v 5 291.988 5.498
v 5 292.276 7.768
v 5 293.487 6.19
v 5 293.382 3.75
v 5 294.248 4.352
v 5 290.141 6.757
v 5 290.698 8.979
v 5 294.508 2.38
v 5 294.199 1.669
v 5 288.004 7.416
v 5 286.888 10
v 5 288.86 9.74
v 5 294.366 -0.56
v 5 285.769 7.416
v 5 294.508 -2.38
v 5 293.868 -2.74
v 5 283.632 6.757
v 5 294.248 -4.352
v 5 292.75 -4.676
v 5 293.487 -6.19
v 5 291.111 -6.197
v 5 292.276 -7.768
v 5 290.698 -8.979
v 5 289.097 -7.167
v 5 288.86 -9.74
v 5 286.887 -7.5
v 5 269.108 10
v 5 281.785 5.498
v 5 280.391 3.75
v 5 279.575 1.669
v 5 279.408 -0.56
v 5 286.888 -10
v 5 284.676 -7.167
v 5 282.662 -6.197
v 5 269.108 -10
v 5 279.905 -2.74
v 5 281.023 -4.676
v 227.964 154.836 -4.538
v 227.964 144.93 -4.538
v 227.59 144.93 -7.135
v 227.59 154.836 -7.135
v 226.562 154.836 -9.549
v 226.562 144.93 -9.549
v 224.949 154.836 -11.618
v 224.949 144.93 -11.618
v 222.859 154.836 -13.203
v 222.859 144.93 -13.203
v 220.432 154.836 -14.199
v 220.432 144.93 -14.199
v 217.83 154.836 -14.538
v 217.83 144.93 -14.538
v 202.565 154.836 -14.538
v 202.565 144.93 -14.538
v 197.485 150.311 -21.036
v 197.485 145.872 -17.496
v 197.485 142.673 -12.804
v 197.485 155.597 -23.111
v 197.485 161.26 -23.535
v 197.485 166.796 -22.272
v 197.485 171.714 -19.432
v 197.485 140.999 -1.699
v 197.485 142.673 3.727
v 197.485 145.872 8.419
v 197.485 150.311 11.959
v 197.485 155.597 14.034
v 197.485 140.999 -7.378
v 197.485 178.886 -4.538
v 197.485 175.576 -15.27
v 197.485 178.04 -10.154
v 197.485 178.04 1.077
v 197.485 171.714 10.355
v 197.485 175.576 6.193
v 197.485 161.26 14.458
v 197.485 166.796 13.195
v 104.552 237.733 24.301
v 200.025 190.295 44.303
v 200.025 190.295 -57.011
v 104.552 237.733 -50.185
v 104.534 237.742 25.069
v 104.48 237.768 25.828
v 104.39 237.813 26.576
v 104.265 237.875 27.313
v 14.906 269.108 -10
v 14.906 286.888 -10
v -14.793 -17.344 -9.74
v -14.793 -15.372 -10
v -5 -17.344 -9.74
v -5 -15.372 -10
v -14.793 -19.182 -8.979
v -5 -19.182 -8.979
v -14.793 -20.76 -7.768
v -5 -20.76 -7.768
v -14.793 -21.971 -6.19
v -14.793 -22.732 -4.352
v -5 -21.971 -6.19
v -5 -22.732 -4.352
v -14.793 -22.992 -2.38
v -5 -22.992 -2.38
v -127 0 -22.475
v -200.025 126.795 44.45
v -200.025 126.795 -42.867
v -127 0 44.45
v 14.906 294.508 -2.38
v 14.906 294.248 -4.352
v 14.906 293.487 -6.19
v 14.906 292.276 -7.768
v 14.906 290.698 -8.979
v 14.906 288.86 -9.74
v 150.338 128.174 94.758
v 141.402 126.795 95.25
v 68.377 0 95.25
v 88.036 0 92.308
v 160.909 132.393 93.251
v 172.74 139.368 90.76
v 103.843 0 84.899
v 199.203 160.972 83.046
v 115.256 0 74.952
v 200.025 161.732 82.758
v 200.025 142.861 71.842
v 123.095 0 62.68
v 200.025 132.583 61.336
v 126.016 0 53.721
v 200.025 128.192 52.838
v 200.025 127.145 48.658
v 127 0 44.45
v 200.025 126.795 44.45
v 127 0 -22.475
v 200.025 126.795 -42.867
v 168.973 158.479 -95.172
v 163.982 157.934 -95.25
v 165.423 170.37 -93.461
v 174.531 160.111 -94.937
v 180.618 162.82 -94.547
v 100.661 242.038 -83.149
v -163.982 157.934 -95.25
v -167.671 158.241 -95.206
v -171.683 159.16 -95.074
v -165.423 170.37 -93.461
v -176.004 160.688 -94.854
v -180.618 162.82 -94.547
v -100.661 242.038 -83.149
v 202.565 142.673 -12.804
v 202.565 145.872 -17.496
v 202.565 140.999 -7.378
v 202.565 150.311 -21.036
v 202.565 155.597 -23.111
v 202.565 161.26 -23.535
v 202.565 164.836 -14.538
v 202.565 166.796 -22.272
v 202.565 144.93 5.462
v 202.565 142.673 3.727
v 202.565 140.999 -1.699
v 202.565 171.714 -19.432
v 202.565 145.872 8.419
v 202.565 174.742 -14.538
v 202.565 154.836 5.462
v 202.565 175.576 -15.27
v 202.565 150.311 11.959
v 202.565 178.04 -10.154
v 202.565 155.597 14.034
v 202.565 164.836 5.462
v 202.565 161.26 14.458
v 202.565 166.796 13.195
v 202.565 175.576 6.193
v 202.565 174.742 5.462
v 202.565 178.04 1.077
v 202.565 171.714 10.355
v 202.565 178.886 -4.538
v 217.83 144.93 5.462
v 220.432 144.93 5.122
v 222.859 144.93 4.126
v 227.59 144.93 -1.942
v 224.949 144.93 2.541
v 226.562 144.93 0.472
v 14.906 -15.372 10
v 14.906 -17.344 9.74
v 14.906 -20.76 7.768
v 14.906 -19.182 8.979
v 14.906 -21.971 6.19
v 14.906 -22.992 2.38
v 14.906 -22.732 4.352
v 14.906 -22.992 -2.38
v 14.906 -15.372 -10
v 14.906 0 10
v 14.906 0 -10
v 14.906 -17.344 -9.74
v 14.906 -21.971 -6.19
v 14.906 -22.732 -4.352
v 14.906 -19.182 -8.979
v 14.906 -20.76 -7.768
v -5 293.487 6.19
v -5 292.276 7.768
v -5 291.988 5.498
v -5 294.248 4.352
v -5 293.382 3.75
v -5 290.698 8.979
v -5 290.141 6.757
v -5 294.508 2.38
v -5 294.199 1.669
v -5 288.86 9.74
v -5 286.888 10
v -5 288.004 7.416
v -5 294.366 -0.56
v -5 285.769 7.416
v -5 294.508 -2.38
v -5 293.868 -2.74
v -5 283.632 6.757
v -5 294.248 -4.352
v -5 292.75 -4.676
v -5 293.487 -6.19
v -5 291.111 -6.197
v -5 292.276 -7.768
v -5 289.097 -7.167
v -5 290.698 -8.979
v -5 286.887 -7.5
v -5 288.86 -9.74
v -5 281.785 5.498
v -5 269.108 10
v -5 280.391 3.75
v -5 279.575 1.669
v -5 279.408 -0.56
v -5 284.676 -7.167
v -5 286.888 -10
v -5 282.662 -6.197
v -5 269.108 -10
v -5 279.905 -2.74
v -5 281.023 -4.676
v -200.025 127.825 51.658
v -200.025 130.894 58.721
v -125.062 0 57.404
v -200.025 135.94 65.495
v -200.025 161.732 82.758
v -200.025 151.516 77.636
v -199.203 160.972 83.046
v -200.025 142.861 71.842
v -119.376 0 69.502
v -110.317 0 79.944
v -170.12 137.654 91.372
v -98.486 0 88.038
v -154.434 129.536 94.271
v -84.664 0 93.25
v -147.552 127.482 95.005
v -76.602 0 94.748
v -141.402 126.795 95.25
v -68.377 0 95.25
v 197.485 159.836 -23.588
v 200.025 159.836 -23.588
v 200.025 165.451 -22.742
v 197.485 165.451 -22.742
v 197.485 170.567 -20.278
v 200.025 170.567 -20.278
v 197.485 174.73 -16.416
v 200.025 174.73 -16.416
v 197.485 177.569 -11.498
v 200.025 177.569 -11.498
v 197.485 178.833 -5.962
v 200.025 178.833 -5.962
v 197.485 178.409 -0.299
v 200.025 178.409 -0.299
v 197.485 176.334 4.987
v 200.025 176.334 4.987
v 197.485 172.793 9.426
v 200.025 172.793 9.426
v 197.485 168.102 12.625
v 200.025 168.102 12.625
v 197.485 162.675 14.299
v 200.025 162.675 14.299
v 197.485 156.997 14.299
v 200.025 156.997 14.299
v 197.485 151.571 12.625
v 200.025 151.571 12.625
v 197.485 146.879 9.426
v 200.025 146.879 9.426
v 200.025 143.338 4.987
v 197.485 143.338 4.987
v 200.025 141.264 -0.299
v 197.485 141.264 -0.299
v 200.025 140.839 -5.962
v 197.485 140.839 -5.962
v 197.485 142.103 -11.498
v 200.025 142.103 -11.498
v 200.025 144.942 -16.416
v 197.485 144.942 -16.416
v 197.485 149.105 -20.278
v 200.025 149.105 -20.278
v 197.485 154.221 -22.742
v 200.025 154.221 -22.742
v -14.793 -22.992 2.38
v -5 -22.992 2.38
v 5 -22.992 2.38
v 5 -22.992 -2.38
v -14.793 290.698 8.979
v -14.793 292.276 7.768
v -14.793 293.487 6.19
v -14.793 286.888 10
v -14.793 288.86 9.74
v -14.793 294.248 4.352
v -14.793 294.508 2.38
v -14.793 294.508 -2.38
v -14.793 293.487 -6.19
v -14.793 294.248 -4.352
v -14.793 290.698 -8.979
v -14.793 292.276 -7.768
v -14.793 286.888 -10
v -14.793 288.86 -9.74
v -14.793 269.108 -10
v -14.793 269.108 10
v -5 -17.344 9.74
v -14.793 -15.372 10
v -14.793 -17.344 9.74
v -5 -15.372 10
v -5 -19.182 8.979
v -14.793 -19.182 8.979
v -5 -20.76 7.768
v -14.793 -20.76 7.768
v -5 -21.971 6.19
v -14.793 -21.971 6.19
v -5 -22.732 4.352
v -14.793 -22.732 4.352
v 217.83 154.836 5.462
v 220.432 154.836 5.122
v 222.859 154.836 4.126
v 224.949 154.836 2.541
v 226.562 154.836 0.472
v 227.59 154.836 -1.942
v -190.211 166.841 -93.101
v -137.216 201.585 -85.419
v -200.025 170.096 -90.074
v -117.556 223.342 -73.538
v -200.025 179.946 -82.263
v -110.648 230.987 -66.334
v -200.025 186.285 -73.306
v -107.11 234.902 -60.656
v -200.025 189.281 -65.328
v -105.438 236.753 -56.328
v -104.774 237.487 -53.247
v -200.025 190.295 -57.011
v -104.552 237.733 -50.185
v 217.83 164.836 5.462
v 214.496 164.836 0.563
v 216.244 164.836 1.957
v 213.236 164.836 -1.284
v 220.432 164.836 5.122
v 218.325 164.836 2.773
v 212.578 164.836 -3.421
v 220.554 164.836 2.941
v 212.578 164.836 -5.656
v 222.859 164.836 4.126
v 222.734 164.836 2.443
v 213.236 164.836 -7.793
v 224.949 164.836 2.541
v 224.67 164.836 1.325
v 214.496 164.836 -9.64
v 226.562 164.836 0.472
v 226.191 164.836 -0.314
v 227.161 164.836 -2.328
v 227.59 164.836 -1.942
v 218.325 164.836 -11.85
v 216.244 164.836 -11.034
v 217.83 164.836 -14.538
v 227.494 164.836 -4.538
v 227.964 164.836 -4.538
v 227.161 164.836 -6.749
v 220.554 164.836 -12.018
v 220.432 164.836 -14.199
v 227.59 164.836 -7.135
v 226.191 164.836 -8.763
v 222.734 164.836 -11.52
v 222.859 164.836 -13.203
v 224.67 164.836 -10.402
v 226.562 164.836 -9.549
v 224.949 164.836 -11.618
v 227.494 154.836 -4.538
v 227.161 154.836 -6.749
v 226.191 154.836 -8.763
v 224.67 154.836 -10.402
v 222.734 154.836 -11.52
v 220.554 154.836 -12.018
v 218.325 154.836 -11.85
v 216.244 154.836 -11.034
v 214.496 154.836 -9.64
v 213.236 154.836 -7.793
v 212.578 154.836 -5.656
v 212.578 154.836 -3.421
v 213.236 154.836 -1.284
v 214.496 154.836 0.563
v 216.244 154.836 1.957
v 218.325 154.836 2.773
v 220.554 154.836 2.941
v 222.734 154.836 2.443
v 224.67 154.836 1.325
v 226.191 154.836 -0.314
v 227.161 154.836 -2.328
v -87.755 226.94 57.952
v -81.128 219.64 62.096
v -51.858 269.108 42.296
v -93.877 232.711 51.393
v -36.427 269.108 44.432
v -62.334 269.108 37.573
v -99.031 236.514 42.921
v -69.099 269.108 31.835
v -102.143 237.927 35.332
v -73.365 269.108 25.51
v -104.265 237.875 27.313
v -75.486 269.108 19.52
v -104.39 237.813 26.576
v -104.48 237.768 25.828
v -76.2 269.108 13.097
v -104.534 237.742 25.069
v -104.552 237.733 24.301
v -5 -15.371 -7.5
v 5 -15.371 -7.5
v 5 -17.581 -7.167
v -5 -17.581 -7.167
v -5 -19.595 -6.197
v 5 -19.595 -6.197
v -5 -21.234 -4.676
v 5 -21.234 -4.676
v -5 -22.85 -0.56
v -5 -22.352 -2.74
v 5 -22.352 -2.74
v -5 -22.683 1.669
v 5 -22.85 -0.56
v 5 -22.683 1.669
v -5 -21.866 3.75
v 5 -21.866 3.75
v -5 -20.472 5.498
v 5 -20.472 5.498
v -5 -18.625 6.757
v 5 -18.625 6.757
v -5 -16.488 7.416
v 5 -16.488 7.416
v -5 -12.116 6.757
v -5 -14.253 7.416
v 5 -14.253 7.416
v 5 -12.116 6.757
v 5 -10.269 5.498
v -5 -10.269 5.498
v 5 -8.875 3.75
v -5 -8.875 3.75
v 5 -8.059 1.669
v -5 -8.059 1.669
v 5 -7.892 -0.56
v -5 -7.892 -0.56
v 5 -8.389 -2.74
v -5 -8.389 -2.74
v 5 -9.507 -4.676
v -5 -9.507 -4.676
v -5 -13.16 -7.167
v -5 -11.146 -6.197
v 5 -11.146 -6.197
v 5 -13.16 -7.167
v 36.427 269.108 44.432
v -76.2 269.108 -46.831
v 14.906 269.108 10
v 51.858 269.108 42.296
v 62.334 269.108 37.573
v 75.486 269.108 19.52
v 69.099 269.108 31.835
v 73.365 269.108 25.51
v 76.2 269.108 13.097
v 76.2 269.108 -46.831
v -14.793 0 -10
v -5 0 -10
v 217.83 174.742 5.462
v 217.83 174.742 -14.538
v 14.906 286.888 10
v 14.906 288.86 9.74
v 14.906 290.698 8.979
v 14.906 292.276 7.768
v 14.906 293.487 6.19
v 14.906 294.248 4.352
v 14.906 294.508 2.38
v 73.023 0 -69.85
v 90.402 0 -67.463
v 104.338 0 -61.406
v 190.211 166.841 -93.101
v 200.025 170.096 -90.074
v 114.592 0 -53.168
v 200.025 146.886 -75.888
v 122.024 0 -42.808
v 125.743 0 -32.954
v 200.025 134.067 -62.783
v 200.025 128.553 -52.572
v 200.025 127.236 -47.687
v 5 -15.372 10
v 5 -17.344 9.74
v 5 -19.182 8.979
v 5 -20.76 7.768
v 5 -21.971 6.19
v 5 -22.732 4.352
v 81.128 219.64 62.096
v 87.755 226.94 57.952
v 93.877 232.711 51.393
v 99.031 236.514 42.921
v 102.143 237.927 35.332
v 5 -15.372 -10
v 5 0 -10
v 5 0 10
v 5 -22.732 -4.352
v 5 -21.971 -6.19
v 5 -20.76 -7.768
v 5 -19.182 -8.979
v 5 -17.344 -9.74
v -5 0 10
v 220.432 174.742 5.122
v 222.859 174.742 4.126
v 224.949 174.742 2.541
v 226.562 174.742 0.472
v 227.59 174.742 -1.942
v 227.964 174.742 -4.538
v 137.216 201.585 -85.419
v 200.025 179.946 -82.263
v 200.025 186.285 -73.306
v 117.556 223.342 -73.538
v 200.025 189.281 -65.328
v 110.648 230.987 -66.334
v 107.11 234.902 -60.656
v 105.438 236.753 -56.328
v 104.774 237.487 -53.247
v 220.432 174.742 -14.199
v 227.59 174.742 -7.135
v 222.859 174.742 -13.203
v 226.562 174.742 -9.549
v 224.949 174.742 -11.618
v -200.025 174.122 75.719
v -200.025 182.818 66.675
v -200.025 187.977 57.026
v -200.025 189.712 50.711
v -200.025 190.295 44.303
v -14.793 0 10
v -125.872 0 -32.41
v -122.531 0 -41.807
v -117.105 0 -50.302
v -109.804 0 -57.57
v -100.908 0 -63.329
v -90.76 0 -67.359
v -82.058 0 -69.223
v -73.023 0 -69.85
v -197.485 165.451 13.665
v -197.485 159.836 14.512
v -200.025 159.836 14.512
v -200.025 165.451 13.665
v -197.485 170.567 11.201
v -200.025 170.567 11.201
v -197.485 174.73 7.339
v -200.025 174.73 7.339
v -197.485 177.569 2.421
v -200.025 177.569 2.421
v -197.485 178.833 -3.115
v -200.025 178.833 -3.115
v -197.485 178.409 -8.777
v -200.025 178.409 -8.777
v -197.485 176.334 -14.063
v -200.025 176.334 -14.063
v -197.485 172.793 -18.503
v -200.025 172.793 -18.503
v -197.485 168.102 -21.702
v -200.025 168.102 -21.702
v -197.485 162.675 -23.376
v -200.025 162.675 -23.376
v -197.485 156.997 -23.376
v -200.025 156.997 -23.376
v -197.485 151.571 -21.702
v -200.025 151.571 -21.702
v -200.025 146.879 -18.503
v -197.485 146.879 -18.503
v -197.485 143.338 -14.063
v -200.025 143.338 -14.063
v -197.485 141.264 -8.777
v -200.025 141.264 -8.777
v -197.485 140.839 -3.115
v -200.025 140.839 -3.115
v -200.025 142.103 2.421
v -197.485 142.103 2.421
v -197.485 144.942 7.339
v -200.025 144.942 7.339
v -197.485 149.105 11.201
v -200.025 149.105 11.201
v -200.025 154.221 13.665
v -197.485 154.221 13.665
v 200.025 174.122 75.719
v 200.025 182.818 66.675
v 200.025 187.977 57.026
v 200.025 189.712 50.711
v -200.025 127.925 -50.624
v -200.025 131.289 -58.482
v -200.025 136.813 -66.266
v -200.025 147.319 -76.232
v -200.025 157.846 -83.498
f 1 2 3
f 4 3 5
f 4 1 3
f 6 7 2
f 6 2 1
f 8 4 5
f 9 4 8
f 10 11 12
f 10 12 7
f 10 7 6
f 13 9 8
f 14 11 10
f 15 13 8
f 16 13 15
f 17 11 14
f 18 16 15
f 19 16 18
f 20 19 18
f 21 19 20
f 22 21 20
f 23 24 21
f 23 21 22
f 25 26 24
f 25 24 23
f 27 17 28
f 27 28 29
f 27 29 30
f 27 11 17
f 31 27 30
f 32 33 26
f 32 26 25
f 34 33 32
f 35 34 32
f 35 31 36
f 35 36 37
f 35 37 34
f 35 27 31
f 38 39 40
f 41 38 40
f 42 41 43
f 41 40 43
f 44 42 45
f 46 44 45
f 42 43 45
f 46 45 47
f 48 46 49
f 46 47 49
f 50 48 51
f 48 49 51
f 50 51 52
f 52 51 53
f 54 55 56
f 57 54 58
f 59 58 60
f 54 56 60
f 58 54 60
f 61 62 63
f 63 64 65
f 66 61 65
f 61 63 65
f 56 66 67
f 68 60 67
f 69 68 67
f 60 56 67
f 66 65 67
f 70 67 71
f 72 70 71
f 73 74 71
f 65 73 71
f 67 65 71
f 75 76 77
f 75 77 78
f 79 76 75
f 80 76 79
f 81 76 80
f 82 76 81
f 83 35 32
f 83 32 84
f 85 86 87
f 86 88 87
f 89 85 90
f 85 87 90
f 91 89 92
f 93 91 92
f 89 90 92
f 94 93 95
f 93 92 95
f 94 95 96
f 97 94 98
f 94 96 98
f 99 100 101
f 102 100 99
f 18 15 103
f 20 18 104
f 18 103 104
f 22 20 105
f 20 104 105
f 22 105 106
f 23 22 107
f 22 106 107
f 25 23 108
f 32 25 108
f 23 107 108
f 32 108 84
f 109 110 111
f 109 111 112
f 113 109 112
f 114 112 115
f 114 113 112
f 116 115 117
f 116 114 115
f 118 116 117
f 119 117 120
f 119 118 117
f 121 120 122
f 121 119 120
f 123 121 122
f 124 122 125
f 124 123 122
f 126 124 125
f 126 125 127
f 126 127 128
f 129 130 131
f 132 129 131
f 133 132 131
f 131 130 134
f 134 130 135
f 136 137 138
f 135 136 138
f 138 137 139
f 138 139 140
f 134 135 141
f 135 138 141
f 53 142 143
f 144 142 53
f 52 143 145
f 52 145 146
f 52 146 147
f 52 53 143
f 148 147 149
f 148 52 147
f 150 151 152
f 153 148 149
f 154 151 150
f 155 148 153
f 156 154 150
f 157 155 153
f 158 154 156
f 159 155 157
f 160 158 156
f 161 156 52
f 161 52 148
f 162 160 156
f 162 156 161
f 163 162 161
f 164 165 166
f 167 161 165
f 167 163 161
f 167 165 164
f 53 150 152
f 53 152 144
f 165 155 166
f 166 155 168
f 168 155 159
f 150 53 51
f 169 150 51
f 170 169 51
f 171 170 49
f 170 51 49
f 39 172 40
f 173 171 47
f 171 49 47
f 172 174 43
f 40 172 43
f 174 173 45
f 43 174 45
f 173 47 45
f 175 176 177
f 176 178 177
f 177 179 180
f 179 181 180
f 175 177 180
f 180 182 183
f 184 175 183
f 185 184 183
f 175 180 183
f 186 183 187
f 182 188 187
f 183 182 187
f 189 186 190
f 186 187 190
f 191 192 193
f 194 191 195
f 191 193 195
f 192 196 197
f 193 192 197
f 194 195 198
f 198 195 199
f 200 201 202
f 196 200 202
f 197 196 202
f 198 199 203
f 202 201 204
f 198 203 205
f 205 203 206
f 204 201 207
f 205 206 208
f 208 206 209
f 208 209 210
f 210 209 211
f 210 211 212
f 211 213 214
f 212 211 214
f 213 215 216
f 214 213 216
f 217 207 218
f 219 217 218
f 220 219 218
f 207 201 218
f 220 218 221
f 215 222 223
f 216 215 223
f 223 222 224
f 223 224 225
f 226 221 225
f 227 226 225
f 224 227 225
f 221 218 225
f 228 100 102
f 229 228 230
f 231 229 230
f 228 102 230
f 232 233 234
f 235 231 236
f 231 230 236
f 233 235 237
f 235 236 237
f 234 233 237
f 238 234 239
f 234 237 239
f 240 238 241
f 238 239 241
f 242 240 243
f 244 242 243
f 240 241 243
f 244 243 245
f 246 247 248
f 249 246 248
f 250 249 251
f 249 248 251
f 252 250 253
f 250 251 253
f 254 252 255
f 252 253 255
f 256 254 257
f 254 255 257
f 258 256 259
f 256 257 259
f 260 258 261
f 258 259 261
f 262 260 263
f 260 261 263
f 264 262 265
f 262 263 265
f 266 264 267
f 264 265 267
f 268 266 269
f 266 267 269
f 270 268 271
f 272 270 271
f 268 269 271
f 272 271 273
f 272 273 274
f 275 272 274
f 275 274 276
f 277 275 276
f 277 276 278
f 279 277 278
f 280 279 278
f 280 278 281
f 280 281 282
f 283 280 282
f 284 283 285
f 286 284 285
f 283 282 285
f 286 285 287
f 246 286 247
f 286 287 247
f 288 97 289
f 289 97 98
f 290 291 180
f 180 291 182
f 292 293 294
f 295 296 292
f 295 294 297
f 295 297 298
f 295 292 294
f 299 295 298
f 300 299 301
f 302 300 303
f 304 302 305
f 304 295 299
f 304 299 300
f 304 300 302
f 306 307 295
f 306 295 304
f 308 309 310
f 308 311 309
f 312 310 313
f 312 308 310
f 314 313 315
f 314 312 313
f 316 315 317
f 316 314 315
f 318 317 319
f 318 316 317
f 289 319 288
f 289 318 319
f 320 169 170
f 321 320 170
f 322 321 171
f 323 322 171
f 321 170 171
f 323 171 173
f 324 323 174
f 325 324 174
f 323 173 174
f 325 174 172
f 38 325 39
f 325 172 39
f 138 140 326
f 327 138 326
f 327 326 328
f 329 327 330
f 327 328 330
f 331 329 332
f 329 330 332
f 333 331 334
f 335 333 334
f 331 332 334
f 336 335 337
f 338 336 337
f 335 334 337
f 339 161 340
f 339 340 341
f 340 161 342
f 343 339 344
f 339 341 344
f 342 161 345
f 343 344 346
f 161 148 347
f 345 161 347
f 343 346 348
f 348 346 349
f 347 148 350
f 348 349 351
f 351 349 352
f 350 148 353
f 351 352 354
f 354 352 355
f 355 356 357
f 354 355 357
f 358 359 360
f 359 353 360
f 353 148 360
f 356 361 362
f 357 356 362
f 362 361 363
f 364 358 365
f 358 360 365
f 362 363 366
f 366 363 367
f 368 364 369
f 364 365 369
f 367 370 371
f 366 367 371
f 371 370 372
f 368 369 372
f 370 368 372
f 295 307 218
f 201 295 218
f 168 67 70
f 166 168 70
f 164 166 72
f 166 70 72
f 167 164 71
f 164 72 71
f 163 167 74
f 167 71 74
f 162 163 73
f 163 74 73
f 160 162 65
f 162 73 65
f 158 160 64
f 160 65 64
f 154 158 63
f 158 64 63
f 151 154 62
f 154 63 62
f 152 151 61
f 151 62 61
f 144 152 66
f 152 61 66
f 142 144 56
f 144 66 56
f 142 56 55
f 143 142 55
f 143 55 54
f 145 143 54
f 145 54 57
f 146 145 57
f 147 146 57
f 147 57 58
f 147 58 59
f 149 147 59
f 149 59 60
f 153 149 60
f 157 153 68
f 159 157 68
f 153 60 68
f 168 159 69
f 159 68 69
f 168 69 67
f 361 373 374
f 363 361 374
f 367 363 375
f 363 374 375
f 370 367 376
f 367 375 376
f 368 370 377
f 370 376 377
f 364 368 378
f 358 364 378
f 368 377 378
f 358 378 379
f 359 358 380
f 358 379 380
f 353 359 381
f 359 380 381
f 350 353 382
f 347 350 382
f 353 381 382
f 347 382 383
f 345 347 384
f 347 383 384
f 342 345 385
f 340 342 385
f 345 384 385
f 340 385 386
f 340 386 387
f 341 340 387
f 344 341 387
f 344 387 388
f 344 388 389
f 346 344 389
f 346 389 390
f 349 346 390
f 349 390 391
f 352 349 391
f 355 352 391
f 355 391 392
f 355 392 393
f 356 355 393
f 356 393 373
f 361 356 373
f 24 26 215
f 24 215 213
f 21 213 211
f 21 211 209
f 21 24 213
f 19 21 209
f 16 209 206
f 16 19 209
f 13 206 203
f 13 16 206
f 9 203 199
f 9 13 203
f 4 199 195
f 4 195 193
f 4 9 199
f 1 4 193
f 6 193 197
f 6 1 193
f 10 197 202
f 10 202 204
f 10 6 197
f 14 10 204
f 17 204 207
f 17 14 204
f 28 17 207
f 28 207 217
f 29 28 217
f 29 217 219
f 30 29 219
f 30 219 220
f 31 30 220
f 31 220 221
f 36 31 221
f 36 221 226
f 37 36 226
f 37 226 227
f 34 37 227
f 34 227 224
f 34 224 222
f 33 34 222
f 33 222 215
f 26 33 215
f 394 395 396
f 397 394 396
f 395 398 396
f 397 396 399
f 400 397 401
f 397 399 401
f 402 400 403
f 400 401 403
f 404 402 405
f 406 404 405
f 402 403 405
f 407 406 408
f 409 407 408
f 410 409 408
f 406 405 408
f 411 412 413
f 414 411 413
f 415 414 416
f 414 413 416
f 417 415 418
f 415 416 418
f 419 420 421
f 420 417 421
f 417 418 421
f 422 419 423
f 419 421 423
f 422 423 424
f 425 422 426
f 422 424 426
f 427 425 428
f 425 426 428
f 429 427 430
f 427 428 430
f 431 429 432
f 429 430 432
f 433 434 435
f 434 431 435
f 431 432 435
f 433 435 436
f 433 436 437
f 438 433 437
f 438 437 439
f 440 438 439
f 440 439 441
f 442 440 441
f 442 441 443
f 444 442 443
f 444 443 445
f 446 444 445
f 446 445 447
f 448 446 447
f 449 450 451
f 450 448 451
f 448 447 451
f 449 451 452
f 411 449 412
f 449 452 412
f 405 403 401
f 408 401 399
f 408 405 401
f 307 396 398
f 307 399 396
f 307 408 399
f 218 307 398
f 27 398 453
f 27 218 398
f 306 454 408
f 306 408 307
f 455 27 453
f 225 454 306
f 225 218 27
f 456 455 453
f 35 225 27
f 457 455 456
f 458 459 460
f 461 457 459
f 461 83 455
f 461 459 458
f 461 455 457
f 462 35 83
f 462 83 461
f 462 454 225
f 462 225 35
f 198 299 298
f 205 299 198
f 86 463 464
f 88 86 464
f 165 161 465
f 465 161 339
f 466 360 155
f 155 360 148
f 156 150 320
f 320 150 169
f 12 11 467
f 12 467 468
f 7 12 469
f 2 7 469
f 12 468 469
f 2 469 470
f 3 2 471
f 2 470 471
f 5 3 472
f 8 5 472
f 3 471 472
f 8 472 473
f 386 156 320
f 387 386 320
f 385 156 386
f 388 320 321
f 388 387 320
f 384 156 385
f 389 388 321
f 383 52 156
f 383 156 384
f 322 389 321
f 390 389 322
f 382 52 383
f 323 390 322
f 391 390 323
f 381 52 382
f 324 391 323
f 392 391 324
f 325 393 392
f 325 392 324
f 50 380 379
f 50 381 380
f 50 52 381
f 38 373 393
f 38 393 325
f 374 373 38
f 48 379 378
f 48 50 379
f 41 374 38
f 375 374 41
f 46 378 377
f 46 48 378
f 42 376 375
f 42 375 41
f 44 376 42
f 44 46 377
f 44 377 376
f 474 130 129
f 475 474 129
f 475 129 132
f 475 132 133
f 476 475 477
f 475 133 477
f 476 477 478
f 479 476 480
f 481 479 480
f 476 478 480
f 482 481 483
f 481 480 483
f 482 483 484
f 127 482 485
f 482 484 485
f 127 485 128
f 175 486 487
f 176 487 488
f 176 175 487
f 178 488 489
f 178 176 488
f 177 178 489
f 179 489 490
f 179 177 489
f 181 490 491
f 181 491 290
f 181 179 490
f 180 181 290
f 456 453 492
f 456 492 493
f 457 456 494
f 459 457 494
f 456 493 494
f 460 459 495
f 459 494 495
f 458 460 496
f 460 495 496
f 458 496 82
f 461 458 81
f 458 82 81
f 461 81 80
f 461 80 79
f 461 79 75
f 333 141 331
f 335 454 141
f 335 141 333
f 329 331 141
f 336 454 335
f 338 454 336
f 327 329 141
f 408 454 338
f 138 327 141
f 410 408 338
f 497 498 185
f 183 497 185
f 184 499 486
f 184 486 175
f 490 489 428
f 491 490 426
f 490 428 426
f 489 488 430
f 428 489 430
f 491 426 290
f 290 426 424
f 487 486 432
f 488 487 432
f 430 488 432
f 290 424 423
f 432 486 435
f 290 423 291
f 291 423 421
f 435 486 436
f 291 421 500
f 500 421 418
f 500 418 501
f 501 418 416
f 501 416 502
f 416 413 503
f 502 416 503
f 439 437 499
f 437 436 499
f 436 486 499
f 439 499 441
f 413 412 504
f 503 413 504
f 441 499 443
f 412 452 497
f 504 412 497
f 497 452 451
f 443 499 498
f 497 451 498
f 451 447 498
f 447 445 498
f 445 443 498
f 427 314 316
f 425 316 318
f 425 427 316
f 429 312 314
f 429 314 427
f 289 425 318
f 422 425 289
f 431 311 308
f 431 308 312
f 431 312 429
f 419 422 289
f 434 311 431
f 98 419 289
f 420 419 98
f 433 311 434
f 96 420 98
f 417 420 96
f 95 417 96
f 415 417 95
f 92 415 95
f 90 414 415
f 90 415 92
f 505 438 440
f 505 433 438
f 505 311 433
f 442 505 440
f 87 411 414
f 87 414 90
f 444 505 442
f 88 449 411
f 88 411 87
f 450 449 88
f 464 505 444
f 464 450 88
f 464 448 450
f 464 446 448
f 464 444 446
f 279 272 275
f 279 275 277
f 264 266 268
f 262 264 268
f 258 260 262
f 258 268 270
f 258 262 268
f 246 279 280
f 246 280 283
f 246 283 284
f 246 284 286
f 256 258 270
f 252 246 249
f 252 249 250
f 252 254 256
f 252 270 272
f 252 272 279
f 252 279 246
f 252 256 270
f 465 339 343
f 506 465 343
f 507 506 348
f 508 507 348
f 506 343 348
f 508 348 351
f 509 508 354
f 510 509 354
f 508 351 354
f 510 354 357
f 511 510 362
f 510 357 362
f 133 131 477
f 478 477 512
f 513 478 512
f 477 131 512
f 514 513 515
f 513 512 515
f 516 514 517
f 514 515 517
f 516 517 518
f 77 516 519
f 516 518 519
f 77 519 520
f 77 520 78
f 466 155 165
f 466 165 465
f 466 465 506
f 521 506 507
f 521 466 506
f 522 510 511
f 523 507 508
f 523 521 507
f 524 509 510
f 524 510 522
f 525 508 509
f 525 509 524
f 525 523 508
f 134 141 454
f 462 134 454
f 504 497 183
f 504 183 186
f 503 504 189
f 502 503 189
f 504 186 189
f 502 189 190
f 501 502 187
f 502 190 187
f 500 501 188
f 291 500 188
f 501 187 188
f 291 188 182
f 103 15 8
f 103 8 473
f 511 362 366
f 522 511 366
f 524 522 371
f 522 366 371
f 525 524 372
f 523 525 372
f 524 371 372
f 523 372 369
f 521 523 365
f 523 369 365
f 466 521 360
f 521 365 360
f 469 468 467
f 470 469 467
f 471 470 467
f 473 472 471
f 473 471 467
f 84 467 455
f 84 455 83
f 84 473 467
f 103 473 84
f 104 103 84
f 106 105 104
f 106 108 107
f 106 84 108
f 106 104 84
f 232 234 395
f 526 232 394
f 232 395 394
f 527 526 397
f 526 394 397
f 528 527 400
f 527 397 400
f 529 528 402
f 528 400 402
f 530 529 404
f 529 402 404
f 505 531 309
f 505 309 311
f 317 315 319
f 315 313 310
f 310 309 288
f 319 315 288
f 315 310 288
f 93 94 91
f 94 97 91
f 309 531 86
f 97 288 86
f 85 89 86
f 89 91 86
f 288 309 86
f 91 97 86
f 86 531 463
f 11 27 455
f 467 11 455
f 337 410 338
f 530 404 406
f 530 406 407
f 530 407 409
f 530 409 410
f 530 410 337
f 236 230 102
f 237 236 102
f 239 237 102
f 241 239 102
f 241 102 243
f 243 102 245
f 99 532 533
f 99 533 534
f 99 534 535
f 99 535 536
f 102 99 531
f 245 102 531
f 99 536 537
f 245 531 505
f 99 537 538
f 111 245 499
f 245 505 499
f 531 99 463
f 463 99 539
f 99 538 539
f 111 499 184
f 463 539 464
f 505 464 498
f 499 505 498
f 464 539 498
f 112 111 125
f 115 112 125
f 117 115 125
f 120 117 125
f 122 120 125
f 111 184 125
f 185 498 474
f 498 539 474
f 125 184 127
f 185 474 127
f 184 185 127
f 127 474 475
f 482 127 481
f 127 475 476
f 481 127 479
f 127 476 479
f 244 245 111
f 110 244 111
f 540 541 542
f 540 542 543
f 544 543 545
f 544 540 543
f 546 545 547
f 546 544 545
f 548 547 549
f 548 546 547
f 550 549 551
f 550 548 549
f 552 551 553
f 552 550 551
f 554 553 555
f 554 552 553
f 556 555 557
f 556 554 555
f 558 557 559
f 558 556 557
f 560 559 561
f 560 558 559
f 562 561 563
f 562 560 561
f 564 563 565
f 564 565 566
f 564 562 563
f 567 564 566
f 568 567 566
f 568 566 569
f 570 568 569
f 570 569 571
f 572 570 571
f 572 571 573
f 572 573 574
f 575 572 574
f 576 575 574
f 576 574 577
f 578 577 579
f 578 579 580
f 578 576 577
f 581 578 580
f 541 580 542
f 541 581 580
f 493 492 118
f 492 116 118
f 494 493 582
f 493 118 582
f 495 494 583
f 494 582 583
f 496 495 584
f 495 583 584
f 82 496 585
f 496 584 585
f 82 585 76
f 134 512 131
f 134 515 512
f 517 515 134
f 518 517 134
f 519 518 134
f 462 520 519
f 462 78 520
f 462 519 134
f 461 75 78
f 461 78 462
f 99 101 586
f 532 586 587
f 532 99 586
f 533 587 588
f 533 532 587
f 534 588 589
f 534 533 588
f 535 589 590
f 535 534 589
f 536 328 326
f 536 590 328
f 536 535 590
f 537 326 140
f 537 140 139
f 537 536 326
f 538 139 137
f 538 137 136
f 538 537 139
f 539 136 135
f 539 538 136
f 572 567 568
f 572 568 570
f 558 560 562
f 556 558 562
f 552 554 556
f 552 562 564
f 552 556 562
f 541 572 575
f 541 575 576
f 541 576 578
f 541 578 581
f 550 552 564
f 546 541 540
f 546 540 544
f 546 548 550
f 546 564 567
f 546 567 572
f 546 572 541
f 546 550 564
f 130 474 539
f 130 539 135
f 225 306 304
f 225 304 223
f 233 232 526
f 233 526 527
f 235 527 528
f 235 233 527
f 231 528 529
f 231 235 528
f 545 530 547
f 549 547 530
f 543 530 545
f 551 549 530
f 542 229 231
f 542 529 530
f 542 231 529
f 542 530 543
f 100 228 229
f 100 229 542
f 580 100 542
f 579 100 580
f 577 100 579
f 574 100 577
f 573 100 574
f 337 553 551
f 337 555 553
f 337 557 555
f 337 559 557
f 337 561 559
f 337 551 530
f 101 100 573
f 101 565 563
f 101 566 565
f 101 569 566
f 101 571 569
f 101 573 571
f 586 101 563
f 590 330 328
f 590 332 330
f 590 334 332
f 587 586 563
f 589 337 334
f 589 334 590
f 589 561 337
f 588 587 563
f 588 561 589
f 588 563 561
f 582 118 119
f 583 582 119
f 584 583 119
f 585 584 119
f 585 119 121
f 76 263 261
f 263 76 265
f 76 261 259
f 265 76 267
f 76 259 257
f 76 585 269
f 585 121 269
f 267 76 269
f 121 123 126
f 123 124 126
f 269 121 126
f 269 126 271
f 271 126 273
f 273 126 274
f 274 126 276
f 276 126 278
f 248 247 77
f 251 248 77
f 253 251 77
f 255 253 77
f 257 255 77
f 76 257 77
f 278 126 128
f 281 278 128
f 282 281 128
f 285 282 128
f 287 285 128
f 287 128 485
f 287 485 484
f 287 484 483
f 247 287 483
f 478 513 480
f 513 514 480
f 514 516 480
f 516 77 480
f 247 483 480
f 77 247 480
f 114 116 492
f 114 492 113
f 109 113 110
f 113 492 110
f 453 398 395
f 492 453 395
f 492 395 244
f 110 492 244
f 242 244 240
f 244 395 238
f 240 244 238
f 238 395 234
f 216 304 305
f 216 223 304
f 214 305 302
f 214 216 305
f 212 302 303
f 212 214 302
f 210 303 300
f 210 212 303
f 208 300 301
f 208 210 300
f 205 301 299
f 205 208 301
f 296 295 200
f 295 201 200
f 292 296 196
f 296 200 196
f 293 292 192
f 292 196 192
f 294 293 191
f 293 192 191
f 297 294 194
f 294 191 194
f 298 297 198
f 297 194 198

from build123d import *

# Parameters (mm, degrees)
SKETCH1_W                   = 400.05
SKETCH1_H                   = 190.5
EXTRUDE1_DEPTH              = 269.108
SKETCH7_OUTSIDE_W           = 296.182
SKETCH7_OUTSIDE_H           = 374.79
CUT_EXTRUDE1_DEPTH          = 431.8
SKETCH8_OUTSIDE_W           = 505.732
SKETCH8_OUTSIDE_H           = 374.79
CUT_EXTRUDE2_DEPTH          = 431.8
FILLET1_R                   = 50.8
FILLET10_R                  = 38.1
SKETCH9_W                   = 9.7930423
SKETCH9_H                   = 20
SKETCH9_W_2                 = 9.906
BOSS_EXTRUDE1_DEPTH         = 25.4
SKETCH11_R                  = 7.5
BOSS_EXTRUDE3_DEPTH         = 29.6990423
FILLET11_R                  = 7.62
FILLET11_OF_MIRROR1_R       = 7.62
SKETCH12_R                  = 19.05
BOSS_EXTRUDE6_DEPTH         = 2.54
SKETCH14_W                  = 20
SKETCH14_H                  = 9.906
BOSS_EXTRUDE7_DEPTH         = 25.4
BOSS_EXTRUDE8_DEPTH         = 29.812
FILLET15_R                  = 10.1346
BODY_MOVE_COPY1_START       = 144.930148569
BODY_MOVE_COPY1_OUTLINE_R   = 7.5
BODY_MOVE_COPY1_DEPTH       = 29.812
BODY_MOVE_COPY1_2_OUTLINE_R = 7.5
BODY_MOVE_COPY1_2_DEPTH     = 9.906
BODY_MOVE_COPY1_START_2     = 164.836148569
BODY_MOVE_COPY1_3_OUTLINE_R = 7.5
BODY_MOVE_COPY1_3_DEPTH     = 9.906
BODY_MOVE_COPY1_START_3     = 197.485
BODY_MOVE_COPY1_4_OUTLINE_R = 19.05
BODY_MOVE_COPY1_4_DEPTH     = 5.08
CUT_EXTRUDE3_START          = -2.54
SKETCH16_R                  = 19.05
CUT_EXTRUDE3_DEPTH          = 2.54


with BuildPart() as part:
    # Sketch1 → Extrude1 (new body)
    with BuildSketch(Plane(origin=(0, 0, 0), x_dir=(1, 0, 0), z_dir=(0, 1, 0))):
        Rectangle(SKETCH1_W, SKETCH1_H)
    extrude(amount=EXTRUDE1_DEPTH)

    # Sketch7 outside → Cut-Extrude1 (cut)
    with BuildSketch(Plane.ZY.offset(200.025)):
        with Locations((0, 134.554)):
            Rectangle(SKETCH7_OUTSIDE_W, SKETCH7_OUTSIDE_H)
        Polygon((44.432087016, 269.108), (95.25, 126.795116664), (95.25, 0), (-69.85, 0), (-95.25, 157.93380788), (-83.14873838, 242.038278884), (-46.830898628, 269.108), align=None, mode=Mode.SUBTRACT)
    extrude(amount=-CUT_EXTRUDE1_DEPTH, mode=Mode.SUBTRACT)

    # Sketch8 outside → Cut-Extrude2 (cut)
    with BuildSketch(Plane.XY.offset(95.25)):
        with Locations((0, 134.554)):
            Rectangle(SKETCH8_OUTSIDE_W, SKETCH8_OUTSIDE_H)
        Polygon((127, 0), (200.025, 126.795116664), (200.025, 190.295116664), (104.551859803, 237.732642625), (76.2, 269.108), (-76.2, 269.108), (-104.551859803, 237.732642625), (-200.025, 190.295116664), (-200.025, 126.795116664), (-127, 0), align=None, mode=Mode.SUBTRACT)
    extrude(amount=-CUT_EXTRUDE2_DEPTH, mode=Mode.SUBTRACT)

    # Fillet1
    fillet1_edges = [part.edges().sort_by_distance(p)[0] for p in [
        (-163.5125, 63.397558332, 95.25),
        (-163.5125, 63.397558332, -80.046030877),
        (163.5125, 63.397558332, -80.046030877),
        (163.5125, 63.397558332, 95.25),
    ]]
    fillet(fillet1_edges, radius=FILLET1_R)

    # Fillet10
    fillet10_edges = [part.edges().sort_by_distance(p)[0] for p in [
        (152.288429902, 214.013879644, -87.180992348),
        (152.288429902, 214.013879644, 64.105416293),
        (-152.288429902, 214.013879644, -87.180992348),
        (-152.288429902, 214.013879644, 64.105416293),
        (90.375929902, 253.420321312, 50.033934662),
        (-90.375929902, 253.420321312, 50.033934662),
    ]]
    fillet(fillet10_edges, radius=FILLET10_R)

    # Sketch9 → Boss-Extrude1 (add)
    with BuildSketch(Plane(origin=(0, 269.108, 0), x_dir=(1, 0, 0), z_dir=(0, 1, 0))):
        with Locations((-9.89652115, 0)):
            Rectangle(SKETCH9_W, SKETCH9_H)
        with Locations((9.953, 0)):
            Rectangle(SKETCH9_W_2, SKETCH9_H)
    boss_extrude1 = extrude(amount=BOSS_EXTRUDE1_DEPTH)

    # Sketch11 → Boss-Extrude3 (add)
    with BuildSketch(Plane(origin=(14.906, 0, 0), x_dir=(0, 0, -1), z_dir=(1, 0, 0))):
        with Locations((0, 286.886577907)):
            Circle(SKETCH11_R)
    boss_extrude3 = extrude(amount=-BOSS_EXTRUDE3_DEPTH)

    # Fillet11
    fillet11_edges = [part.edges().sort_by_distance(p)[0] for p in [
        (-9.89652115, 294.508, 10),
        (-9.89652115, 294.508, -10),
        (9.953, 294.508, -10),
        (9.953, 294.508, 10),
    ]]
    fillet(fillet11_edges, radius=FILLET11_R)

    # Mirror1: Boss-Extrude1, Boss-Extrude3 across plane
    add(boss_extrude1.mirror(Plane.ZX.offset(135.758)))
    add(boss_extrude3.mirror(Plane.ZX.offset(135.758)))

    # Fillet11 of Mirror1
    fillet11_of_mirror1_edges = [part.edges().sort_by_distance(p)[0] for p in [
        (-9.89652115, -22.992, 10),
        (-9.89652115, -22.992, -10),
        (9.953, -22.992, -10),
        (9.953, -22.992, 10),
    ]]
    fillet(fillet11_of_mirror1_edges, radius=FILLET11_OF_MIRROR1_R)


with BuildPart() as body_2:
    # Sketch12 → Boss-Extrude6 (new, symmetric)
    with BuildSketch(Plane(origin=(200.025, 0, 0), x_dir=(0, 0, -1), z_dir=(1, 0, 0))):
        with Locations((4.538473093, 159.836148569)):
            Circle(SKETCH12_R)
    extrude(amount=BOSS_EXTRUDE6_DEPTH, both=True)

    # Sketch14 → Boss-Extrude7 (add)
    with BuildSketch(Plane(origin=(202.565, 0, 0), x_dir=(0, 0, -1), z_dir=(1, 0, 0))):
        with Locations((4.538473093, 169.789148569)):
            Rectangle(SKETCH14_W, SKETCH14_H)
        with Locations((4.538473093, 149.883148569)):
            Rectangle(SKETCH14_W, SKETCH14_H)
    extrude(amount=BOSS_EXTRUDE7_DEPTH)

    # Sketch15 → Boss-Extrude8 (add)
    with BuildSketch(Plane.XZ.offset(-144.930148569)):
        with BuildLine():
            ThreePointArc((212.493733331, -4.538473093), (219.993733331, -12.038473093), (227.493733331, -4.538473093))
            Line((227.493733331, -4.538473093), (212.493733331, -4.538473093))
        make_face()
        with BuildLine():
            Line((212.493733331, -4.538473093), (227.493733331, -4.538473093))
            ThreePointArc((227.493733331, -4.538473093), (219.993733331, 2.961526907), (212.493733331, -4.538473093))
        make_face()
    extrude(amount=-BOSS_EXTRUDE8_DEPTH)

    # Fillet15
    # the kernel refuses this fillet: 10.1346 mm, written as the material it takes off along each edge
    with BuildSketch(Plane(origin=(227.965, 200.078648569, 5.461526907), x_dir=(-1, 0, 0), z_dir=(0, -1, 0)), Plane(origin=(227.965, 139.499648569, -14.538473093), x_dir=(-1, 0, 0), z_dir=(0, 1, 0))) as fillet15_piece_1:
        with BuildLine():
            CenterArc((FILLET15_R, FILLET15_R), FILLET15_R, 180, 90)
            Line((0, FILLET15_R), (0, 0))
            Line((0, 0), (FILLET15_R, 0))
        make_face()
    extrude(amount=60.579, mode=Mode.SUBTRACT)
    with BuildSketch(Plane(origin=(227.965, 119.593648569, 5.461526907), x_dir=(-1, 0, 0), z_dir=(0, 1, 0)), Plane(origin=(227.965, 180.172648569, -14.538473093), x_dir=(-1, 0, 0), z_dir=(0, -1, 0))) as fillet15_piece_2:
        with BuildLine():
            CenterArc((FILLET15_R, -FILLET15_R), FILLET15_R, 90, 90)
            Line((0, -FILLET15_R), (0, 0))
            Line((0, 0), (FILLET15_R, 0))
        make_face()
    extrude(amount=60.579, mode=Mode.SUBTRACT)


with BuildPart() as body_3:
    # Body-Move/Copy1: read off the stored shape, not the designer's step
    # Body-Move/Copy1 outline → Body-Move/Copy1 (new body)
    with BuildSketch(Plane(origin=(0, 0, 0), x_dir=(1, 0, 0), z_dir=(0, 1, 0)).offset(BODY_MOVE_COPY1_START)):
        with Locations((219.993733331, 4.538473093)):
            Circle(BODY_MOVE_COPY1_OUTLINE_R)
    extrude(amount=BODY_MOVE_COPY1_DEPTH)

    # Body-Move_Copy1 2 outline → Body-Move_Copy1 2 (add)
    with BuildSketch(Plane(origin=(0, 0, 0), x_dir=(1, 0, 0), z_dir=(0, 1, 0)).offset(BODY_MOVE_COPY1_START)):
        with BuildLine():
            Line((202.565, 14.538473093), (202.565, -5.461526907))
            Line((202.565, -5.461526907), (217.8304, -5.461526907))
            ThreePointArc((217.8304, -5.461526907), (224.948897032, -2.54060261), (227.964106133, 4.538473093))
            ThreePointArc((227.964106133, 4.538473093), (224.948897032, 11.617548797), (217.8304, 14.538473093))
            Line((217.8304, 14.538473093), (202.565, 14.538473093))
        make_face()
        with Locations((219.993733331, 4.538473093)):
            Circle(BODY_MOVE_COPY1_2_OUTLINE_R, mode=Mode.SUBTRACT)
    extrude(amount=BODY_MOVE_COPY1_2_DEPTH)

    # Body-Move_Copy1 3 outline → Body-Move_Copy1 3 (add)
    with BuildSketch(Plane(origin=(0, 0, 0), x_dir=(1, 0, 0), z_dir=(0, 1, 0)).offset(BODY_MOVE_COPY1_START_2)):
        with BuildLine():
            Line((202.565, 14.538473093), (202.565, -5.461526907))
            Line((202.565, -5.461526907), (217.8304, -5.461526907))
            ThreePointArc((217.8304, -5.461526907), (224.948897032, -2.54060261), (227.964106133, 4.538473093))
            ThreePointArc((227.964106133, 4.538473093), (224.948897032, 11.617548797), (217.8304, 14.538473093))
            Line((217.8304, 14.538473093), (202.565, 14.538473093))
        make_face()
        with Locations((219.993733331, 4.538473093)):
            Circle(BODY_MOVE_COPY1_3_OUTLINE_R, mode=Mode.SUBTRACT)
    extrude(amount=BODY_MOVE_COPY1_3_DEPTH)

    # Body-Move_Copy1 4 outline → Body-Move_Copy1 4 (add)
    with BuildSketch(Plane.YZ.offset(BODY_MOVE_COPY1_START_3)):
        with Locations((159.836148569, -4.538473093)):
            Circle(BODY_MOVE_COPY1_4_OUTLINE_R)
    extrude(amount=BODY_MOVE_COPY1_4_DEPTH)


with BuildPart() as part_1:
    add(part.part)

    # Combine1: cut body 2
    add(body_2.part, mode=Mode.SUBTRACT)

    # Sketch16 → Cut-Extrude3 (cut)
    with BuildSketch(Plane.ZY.offset(200.025).offset(CUT_EXTRUDE3_START)):
        with Locations((-4.538473093, 159.836148569)):
            Circle(SKETCH16_R)
    extrude(amount=CUT_EXTRUDE3_DEPTH, mode=Mode.SUBTRACT)


solid = Compound([body_3.part, part_1.part])
